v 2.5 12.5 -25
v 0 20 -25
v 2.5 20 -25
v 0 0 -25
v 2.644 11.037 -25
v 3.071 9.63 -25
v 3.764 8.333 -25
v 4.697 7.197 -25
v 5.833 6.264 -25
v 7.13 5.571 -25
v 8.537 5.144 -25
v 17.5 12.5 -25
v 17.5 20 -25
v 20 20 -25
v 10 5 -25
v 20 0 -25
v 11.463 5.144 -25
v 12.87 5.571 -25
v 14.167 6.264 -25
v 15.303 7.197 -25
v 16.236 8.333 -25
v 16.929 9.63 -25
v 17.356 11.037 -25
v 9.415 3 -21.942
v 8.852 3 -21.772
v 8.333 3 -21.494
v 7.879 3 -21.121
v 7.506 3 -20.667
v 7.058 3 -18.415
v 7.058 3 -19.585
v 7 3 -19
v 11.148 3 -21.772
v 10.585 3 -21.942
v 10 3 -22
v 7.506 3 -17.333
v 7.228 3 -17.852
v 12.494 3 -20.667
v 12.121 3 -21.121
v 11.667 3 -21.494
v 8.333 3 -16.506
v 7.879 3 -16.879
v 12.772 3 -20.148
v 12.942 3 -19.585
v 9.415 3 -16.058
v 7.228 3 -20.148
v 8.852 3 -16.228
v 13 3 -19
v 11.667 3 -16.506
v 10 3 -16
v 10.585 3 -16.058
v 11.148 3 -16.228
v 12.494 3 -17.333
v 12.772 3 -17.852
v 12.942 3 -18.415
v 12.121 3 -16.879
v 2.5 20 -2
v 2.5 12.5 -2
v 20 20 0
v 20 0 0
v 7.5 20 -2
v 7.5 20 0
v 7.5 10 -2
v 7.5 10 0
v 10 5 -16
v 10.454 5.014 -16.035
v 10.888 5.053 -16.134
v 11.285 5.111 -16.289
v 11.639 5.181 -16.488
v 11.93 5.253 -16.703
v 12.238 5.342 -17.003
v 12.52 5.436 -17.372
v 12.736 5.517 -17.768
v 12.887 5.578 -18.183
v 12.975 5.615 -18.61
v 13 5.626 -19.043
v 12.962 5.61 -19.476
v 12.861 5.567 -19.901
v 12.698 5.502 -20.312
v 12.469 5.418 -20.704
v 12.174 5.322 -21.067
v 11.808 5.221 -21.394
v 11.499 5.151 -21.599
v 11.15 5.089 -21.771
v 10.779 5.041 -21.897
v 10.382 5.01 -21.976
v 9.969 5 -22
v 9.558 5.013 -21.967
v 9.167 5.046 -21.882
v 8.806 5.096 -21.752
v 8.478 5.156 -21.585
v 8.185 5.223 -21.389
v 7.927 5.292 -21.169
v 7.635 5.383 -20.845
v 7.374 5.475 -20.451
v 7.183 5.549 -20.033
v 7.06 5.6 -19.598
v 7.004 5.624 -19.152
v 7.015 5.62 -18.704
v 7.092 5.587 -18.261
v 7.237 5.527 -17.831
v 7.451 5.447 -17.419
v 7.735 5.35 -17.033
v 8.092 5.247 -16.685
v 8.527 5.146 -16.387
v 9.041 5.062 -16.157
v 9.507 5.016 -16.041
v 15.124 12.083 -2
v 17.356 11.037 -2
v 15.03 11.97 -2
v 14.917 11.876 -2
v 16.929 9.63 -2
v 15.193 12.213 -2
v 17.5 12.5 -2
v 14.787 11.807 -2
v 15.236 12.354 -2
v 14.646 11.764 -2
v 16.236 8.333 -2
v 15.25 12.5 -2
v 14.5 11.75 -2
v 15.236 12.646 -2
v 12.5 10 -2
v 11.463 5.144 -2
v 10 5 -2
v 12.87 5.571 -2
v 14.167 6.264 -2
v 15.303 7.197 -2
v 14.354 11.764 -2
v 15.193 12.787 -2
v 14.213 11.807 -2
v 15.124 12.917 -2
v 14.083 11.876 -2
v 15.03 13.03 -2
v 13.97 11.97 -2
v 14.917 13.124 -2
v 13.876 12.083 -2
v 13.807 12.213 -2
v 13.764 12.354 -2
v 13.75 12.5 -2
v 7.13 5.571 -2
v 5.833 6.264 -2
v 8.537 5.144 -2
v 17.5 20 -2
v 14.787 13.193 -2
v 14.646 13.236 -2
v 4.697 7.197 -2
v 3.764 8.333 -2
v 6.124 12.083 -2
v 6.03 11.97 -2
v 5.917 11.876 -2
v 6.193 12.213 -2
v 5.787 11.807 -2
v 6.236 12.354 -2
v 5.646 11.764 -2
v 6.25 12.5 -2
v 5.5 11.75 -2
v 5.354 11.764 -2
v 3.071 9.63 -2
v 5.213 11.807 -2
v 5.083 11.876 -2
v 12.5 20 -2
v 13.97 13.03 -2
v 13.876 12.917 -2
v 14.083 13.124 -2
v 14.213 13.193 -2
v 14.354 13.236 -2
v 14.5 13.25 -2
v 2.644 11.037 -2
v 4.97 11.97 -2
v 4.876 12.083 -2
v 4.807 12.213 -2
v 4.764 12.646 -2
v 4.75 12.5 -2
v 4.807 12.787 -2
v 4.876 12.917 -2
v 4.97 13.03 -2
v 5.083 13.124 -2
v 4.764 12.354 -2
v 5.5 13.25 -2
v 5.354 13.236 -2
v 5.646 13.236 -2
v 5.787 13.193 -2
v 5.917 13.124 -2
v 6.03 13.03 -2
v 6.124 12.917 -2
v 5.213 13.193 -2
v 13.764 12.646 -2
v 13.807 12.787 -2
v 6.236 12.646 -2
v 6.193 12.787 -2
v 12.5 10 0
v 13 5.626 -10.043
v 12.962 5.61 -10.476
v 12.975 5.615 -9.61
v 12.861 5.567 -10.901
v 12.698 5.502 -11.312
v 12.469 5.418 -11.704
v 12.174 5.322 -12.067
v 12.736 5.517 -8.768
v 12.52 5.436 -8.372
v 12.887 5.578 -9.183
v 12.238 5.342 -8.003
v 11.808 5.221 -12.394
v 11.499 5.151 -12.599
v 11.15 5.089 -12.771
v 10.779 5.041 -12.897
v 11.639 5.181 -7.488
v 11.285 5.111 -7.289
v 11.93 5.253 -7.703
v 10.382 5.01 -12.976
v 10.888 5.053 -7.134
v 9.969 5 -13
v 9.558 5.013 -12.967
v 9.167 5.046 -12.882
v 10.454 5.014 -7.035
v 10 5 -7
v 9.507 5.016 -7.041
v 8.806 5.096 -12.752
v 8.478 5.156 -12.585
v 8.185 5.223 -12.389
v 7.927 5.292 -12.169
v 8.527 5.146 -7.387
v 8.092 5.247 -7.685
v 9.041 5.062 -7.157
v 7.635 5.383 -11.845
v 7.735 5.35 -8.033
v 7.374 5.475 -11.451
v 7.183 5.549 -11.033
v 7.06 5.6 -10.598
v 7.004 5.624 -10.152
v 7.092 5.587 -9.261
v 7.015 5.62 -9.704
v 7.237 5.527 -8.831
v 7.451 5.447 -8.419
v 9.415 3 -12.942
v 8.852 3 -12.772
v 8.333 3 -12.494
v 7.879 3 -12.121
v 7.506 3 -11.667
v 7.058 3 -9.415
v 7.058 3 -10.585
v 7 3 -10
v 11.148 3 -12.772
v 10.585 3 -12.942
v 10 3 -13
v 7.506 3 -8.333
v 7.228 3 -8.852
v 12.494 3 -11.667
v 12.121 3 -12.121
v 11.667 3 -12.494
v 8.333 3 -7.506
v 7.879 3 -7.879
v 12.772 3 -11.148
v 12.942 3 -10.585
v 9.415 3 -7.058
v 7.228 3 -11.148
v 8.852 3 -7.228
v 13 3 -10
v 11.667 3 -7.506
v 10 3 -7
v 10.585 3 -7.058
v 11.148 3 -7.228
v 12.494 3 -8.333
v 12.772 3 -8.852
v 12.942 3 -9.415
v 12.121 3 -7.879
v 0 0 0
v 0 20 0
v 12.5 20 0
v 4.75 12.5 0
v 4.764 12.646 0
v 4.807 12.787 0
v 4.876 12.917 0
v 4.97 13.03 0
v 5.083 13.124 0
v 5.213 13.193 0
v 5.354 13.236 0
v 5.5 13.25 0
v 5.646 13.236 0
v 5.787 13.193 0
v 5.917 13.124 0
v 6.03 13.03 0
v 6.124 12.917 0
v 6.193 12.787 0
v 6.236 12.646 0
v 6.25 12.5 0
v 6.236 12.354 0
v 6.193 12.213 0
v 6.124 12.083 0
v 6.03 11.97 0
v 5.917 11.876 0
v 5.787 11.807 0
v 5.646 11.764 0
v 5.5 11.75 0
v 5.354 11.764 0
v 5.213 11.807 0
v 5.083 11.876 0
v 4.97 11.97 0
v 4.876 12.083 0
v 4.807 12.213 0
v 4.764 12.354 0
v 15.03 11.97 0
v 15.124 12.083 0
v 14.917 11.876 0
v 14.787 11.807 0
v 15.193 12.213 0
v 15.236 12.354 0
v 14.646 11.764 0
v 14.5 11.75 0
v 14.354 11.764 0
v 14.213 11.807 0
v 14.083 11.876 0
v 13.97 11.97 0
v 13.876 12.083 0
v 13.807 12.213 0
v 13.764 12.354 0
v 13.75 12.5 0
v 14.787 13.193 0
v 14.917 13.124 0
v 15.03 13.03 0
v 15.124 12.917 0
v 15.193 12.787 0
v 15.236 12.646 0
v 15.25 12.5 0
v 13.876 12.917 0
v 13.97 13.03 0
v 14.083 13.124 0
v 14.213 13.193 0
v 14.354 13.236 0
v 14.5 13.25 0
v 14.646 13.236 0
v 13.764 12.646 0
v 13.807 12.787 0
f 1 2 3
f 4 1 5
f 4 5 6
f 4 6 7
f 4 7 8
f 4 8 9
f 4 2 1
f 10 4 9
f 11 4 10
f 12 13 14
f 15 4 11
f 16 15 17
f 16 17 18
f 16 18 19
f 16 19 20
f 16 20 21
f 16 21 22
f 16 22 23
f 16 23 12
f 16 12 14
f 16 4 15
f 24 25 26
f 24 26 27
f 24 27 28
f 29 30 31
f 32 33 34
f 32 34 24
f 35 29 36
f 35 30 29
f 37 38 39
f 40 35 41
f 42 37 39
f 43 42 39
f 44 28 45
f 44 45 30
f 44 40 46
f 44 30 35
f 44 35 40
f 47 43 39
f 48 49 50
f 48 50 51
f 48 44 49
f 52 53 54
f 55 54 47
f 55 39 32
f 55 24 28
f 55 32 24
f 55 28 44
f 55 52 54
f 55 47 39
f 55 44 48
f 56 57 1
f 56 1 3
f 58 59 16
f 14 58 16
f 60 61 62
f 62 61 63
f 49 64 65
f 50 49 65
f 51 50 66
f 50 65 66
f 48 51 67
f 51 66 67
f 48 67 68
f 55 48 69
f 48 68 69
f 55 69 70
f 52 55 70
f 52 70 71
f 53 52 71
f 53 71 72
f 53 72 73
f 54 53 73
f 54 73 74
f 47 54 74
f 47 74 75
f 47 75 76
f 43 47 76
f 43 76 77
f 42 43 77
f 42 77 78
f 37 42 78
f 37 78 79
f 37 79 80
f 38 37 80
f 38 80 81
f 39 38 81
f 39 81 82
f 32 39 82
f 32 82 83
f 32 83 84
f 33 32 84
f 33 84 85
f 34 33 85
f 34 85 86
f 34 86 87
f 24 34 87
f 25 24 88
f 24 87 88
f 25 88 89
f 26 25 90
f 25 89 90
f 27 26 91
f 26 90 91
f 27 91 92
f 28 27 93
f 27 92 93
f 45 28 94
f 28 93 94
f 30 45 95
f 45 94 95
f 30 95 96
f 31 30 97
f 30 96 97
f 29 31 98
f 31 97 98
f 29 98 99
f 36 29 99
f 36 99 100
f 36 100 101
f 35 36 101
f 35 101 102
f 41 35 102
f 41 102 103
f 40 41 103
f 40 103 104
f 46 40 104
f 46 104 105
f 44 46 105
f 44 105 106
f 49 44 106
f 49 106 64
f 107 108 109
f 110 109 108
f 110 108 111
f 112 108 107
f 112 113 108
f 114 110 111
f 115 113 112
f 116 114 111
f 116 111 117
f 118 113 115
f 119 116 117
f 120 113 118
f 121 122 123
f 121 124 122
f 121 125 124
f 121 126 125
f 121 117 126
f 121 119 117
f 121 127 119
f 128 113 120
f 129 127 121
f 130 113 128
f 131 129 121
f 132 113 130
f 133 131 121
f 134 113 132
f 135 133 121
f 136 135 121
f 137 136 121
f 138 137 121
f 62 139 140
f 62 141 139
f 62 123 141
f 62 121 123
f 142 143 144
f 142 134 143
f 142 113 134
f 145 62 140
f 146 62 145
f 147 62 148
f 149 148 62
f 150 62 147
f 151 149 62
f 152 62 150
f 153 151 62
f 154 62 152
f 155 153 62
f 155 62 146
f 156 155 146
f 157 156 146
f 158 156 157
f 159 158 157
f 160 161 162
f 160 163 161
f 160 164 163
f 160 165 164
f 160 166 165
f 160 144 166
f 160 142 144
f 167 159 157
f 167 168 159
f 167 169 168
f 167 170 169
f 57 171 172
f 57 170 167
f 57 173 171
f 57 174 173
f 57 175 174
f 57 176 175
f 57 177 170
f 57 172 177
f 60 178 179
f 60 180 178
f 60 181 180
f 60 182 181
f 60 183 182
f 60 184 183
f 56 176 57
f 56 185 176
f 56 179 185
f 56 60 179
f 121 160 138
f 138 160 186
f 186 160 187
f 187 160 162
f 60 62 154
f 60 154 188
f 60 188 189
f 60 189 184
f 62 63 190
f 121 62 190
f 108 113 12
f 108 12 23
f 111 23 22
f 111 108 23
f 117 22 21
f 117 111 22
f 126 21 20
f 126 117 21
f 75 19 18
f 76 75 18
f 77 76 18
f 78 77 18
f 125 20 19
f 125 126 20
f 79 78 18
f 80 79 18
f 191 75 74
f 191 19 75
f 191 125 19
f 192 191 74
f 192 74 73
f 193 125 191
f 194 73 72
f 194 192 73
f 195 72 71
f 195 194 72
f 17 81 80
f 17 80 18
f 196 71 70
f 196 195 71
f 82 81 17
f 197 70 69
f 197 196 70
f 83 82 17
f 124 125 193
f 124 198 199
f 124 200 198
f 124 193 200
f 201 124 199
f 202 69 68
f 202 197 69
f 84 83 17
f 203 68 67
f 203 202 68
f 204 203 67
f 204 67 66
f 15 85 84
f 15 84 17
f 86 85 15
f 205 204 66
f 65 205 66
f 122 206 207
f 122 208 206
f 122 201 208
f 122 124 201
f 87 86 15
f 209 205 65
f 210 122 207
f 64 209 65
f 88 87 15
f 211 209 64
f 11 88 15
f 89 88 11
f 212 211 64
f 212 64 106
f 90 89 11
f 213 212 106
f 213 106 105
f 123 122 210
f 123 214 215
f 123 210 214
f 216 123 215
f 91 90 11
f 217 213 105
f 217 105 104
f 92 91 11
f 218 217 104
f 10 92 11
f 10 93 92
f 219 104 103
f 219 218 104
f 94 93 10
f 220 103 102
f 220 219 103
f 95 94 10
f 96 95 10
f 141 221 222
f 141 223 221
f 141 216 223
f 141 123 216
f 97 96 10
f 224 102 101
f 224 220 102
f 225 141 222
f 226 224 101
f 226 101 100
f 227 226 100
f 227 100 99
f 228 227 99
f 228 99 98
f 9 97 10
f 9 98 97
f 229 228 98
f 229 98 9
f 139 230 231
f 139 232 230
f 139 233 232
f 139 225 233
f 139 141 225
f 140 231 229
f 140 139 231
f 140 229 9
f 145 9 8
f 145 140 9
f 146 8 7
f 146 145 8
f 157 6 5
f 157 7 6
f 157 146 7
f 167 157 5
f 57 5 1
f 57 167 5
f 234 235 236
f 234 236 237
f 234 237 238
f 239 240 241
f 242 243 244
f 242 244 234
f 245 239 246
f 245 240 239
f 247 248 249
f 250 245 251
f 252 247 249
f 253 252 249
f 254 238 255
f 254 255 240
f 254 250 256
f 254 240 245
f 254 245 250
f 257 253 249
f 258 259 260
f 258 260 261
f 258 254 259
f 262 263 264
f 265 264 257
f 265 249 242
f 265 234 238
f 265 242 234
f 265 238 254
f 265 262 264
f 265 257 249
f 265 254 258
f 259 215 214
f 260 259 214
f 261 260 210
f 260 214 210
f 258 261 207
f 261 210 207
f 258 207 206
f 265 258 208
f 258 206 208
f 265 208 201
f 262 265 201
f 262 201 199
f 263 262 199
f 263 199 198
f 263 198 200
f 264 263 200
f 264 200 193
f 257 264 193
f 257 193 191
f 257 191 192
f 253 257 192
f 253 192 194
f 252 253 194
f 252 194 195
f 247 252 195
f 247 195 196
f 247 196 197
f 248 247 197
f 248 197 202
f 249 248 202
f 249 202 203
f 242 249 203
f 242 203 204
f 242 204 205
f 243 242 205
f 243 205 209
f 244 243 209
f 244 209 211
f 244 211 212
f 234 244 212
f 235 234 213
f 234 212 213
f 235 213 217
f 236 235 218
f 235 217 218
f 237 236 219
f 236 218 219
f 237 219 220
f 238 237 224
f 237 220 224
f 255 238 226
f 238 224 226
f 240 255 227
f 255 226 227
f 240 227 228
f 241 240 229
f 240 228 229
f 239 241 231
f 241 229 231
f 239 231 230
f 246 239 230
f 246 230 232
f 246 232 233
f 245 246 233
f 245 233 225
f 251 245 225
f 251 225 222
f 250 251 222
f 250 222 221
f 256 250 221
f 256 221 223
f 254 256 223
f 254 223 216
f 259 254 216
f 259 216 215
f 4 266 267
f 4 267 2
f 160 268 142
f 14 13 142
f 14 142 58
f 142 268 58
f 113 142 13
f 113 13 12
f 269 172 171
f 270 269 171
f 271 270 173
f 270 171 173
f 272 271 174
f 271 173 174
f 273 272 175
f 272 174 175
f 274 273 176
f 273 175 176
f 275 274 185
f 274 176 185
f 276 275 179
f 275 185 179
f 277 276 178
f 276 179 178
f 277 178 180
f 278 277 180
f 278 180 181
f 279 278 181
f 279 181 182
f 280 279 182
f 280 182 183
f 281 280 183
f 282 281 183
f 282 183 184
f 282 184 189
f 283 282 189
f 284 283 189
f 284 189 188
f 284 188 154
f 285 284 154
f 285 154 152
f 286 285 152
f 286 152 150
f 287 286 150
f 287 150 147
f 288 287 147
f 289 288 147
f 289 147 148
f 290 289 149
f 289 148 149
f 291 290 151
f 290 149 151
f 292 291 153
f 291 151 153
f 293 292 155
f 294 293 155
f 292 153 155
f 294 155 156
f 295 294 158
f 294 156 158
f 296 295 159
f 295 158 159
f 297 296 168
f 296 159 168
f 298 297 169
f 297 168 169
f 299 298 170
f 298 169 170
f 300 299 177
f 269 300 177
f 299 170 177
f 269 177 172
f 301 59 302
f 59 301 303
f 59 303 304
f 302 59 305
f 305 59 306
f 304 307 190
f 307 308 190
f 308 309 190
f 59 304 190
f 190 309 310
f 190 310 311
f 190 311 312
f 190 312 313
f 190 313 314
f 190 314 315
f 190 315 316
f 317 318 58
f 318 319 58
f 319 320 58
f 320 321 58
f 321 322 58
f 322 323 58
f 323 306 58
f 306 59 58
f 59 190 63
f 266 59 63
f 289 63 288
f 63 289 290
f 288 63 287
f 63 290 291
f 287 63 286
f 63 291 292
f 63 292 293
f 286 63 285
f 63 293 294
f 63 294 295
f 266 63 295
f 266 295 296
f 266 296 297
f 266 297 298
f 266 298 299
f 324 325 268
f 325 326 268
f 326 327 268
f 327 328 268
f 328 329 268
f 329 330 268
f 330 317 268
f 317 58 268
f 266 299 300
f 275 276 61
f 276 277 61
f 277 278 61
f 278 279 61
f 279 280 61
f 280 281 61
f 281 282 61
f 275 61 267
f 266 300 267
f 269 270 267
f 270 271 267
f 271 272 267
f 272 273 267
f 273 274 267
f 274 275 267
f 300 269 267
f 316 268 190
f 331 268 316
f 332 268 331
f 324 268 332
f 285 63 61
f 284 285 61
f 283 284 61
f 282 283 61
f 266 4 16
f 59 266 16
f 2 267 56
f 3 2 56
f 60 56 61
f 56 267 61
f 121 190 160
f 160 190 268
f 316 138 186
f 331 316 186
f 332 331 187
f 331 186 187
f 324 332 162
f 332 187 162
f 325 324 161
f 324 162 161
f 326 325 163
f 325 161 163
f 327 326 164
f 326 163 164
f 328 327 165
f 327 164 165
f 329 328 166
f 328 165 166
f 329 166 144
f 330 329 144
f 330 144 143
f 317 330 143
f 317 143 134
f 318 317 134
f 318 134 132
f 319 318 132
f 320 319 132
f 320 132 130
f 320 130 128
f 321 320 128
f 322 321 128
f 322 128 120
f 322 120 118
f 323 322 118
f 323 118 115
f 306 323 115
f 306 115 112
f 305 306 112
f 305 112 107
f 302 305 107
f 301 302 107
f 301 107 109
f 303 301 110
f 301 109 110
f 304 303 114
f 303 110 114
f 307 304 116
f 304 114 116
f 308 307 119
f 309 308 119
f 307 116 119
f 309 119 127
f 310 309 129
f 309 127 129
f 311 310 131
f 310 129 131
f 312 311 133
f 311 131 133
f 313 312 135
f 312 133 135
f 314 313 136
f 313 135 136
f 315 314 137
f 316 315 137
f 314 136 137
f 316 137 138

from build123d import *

# Parameters (mm, degrees)
IZIM1_W                     = 20
IZIM1_H                     = 25
Y_KSEKLIK_EKSTR_ZYON1_DEPTH = 20
KES_EKSTR_ZYON3_DEPTH       = 32
IZIM3_R                     = 3
KES_EKSTR_ZYON4_DEPTH       = 17
Y_KSEKLIK_EKSTR_ZYON2_DEPTH = 2
IZIM5_R                     = 0.75
KES_EKSTR_ZYON5_DEPTH       = 32


with BuildPart() as part:
    # Çizim1 → Yükseklik-Ekstrüzyon1 (new body)
    with BuildSketch(Plane(origin=(0, 0, 0), x_dir=(1, 0, 0), z_dir=(0, 1, 0))):
        with Locations((10, 12.5)):
            Rectangle(IZIM1_W, IZIM1_H)
    extrude(amount=Y_KSEKLIK_EKSTR_ZYON1_DEPTH)

    # Çizim2 → Kes-Ekstrüzyon3 (cut)
    with BuildSketch(Plane.XY):
        with BuildLine():
            Line((2.5, 12.5), (2.5, 20))
            Line((2.5, 20), (17.5, 20))
            Line((17.5, 20), (17.5, 12.5))
            ThreePointArc((17.5, 12.5), (10, 5), (2.5, 12.5))
        make_face()
    extrude(amount=-KES_EKSTR_ZYON3_DEPTH, mode=Mode.SUBTRACT)

    # Çizim3 → Kes-Ekstrüzyon4 (cut)
    with BuildSketch(Plane(origin=(0, 20, 0), x_dir=(1, 0, 0), z_dir=(0, 1, 0))):
        with Locations(Location((10, 10, 0), (0, 0, 270))):
            Circle(IZIM3_R)
        with Locations(Location((10, 19, 0), (0, 0, 270))):
            Circle(IZIM3_R)
    extrude(amount=-KES_EKSTR_ZYON4_DEPTH, mode=Mode.SUBTRACT)

    # Çizim4 → Yükseklik-Ekstrüzyon2 (add)
    with BuildSketch(Plane.XY):
        Polygon((12.5, 20), (20, 20), (20, 0), (0, 0), (0, 20), (7.5, 20), (7.5, 10), (12.5, 10), align=None)
    extrude(amount=-Y_KSEKLIK_EKSTR_ZYON2_DEPTH)

    # Çizim5 → Kes-Ekstrüzyon5 (cut)
    with BuildSketch(Plane(origin=(0, 0, -25), x_dir=(-1, 0, 0), z_dir=(0, 0, -1))):
        with Locations((-14.5, 12.5)):
            Circle(IZIM5_R)
        with Locations((-5.5, 12.5)):
            Circle(IZIM5_R)
    extrude(amount=-KES_EKSTR_ZYON5_DEPTH, mode=Mode.SUBTRACT)


solid = part.part
